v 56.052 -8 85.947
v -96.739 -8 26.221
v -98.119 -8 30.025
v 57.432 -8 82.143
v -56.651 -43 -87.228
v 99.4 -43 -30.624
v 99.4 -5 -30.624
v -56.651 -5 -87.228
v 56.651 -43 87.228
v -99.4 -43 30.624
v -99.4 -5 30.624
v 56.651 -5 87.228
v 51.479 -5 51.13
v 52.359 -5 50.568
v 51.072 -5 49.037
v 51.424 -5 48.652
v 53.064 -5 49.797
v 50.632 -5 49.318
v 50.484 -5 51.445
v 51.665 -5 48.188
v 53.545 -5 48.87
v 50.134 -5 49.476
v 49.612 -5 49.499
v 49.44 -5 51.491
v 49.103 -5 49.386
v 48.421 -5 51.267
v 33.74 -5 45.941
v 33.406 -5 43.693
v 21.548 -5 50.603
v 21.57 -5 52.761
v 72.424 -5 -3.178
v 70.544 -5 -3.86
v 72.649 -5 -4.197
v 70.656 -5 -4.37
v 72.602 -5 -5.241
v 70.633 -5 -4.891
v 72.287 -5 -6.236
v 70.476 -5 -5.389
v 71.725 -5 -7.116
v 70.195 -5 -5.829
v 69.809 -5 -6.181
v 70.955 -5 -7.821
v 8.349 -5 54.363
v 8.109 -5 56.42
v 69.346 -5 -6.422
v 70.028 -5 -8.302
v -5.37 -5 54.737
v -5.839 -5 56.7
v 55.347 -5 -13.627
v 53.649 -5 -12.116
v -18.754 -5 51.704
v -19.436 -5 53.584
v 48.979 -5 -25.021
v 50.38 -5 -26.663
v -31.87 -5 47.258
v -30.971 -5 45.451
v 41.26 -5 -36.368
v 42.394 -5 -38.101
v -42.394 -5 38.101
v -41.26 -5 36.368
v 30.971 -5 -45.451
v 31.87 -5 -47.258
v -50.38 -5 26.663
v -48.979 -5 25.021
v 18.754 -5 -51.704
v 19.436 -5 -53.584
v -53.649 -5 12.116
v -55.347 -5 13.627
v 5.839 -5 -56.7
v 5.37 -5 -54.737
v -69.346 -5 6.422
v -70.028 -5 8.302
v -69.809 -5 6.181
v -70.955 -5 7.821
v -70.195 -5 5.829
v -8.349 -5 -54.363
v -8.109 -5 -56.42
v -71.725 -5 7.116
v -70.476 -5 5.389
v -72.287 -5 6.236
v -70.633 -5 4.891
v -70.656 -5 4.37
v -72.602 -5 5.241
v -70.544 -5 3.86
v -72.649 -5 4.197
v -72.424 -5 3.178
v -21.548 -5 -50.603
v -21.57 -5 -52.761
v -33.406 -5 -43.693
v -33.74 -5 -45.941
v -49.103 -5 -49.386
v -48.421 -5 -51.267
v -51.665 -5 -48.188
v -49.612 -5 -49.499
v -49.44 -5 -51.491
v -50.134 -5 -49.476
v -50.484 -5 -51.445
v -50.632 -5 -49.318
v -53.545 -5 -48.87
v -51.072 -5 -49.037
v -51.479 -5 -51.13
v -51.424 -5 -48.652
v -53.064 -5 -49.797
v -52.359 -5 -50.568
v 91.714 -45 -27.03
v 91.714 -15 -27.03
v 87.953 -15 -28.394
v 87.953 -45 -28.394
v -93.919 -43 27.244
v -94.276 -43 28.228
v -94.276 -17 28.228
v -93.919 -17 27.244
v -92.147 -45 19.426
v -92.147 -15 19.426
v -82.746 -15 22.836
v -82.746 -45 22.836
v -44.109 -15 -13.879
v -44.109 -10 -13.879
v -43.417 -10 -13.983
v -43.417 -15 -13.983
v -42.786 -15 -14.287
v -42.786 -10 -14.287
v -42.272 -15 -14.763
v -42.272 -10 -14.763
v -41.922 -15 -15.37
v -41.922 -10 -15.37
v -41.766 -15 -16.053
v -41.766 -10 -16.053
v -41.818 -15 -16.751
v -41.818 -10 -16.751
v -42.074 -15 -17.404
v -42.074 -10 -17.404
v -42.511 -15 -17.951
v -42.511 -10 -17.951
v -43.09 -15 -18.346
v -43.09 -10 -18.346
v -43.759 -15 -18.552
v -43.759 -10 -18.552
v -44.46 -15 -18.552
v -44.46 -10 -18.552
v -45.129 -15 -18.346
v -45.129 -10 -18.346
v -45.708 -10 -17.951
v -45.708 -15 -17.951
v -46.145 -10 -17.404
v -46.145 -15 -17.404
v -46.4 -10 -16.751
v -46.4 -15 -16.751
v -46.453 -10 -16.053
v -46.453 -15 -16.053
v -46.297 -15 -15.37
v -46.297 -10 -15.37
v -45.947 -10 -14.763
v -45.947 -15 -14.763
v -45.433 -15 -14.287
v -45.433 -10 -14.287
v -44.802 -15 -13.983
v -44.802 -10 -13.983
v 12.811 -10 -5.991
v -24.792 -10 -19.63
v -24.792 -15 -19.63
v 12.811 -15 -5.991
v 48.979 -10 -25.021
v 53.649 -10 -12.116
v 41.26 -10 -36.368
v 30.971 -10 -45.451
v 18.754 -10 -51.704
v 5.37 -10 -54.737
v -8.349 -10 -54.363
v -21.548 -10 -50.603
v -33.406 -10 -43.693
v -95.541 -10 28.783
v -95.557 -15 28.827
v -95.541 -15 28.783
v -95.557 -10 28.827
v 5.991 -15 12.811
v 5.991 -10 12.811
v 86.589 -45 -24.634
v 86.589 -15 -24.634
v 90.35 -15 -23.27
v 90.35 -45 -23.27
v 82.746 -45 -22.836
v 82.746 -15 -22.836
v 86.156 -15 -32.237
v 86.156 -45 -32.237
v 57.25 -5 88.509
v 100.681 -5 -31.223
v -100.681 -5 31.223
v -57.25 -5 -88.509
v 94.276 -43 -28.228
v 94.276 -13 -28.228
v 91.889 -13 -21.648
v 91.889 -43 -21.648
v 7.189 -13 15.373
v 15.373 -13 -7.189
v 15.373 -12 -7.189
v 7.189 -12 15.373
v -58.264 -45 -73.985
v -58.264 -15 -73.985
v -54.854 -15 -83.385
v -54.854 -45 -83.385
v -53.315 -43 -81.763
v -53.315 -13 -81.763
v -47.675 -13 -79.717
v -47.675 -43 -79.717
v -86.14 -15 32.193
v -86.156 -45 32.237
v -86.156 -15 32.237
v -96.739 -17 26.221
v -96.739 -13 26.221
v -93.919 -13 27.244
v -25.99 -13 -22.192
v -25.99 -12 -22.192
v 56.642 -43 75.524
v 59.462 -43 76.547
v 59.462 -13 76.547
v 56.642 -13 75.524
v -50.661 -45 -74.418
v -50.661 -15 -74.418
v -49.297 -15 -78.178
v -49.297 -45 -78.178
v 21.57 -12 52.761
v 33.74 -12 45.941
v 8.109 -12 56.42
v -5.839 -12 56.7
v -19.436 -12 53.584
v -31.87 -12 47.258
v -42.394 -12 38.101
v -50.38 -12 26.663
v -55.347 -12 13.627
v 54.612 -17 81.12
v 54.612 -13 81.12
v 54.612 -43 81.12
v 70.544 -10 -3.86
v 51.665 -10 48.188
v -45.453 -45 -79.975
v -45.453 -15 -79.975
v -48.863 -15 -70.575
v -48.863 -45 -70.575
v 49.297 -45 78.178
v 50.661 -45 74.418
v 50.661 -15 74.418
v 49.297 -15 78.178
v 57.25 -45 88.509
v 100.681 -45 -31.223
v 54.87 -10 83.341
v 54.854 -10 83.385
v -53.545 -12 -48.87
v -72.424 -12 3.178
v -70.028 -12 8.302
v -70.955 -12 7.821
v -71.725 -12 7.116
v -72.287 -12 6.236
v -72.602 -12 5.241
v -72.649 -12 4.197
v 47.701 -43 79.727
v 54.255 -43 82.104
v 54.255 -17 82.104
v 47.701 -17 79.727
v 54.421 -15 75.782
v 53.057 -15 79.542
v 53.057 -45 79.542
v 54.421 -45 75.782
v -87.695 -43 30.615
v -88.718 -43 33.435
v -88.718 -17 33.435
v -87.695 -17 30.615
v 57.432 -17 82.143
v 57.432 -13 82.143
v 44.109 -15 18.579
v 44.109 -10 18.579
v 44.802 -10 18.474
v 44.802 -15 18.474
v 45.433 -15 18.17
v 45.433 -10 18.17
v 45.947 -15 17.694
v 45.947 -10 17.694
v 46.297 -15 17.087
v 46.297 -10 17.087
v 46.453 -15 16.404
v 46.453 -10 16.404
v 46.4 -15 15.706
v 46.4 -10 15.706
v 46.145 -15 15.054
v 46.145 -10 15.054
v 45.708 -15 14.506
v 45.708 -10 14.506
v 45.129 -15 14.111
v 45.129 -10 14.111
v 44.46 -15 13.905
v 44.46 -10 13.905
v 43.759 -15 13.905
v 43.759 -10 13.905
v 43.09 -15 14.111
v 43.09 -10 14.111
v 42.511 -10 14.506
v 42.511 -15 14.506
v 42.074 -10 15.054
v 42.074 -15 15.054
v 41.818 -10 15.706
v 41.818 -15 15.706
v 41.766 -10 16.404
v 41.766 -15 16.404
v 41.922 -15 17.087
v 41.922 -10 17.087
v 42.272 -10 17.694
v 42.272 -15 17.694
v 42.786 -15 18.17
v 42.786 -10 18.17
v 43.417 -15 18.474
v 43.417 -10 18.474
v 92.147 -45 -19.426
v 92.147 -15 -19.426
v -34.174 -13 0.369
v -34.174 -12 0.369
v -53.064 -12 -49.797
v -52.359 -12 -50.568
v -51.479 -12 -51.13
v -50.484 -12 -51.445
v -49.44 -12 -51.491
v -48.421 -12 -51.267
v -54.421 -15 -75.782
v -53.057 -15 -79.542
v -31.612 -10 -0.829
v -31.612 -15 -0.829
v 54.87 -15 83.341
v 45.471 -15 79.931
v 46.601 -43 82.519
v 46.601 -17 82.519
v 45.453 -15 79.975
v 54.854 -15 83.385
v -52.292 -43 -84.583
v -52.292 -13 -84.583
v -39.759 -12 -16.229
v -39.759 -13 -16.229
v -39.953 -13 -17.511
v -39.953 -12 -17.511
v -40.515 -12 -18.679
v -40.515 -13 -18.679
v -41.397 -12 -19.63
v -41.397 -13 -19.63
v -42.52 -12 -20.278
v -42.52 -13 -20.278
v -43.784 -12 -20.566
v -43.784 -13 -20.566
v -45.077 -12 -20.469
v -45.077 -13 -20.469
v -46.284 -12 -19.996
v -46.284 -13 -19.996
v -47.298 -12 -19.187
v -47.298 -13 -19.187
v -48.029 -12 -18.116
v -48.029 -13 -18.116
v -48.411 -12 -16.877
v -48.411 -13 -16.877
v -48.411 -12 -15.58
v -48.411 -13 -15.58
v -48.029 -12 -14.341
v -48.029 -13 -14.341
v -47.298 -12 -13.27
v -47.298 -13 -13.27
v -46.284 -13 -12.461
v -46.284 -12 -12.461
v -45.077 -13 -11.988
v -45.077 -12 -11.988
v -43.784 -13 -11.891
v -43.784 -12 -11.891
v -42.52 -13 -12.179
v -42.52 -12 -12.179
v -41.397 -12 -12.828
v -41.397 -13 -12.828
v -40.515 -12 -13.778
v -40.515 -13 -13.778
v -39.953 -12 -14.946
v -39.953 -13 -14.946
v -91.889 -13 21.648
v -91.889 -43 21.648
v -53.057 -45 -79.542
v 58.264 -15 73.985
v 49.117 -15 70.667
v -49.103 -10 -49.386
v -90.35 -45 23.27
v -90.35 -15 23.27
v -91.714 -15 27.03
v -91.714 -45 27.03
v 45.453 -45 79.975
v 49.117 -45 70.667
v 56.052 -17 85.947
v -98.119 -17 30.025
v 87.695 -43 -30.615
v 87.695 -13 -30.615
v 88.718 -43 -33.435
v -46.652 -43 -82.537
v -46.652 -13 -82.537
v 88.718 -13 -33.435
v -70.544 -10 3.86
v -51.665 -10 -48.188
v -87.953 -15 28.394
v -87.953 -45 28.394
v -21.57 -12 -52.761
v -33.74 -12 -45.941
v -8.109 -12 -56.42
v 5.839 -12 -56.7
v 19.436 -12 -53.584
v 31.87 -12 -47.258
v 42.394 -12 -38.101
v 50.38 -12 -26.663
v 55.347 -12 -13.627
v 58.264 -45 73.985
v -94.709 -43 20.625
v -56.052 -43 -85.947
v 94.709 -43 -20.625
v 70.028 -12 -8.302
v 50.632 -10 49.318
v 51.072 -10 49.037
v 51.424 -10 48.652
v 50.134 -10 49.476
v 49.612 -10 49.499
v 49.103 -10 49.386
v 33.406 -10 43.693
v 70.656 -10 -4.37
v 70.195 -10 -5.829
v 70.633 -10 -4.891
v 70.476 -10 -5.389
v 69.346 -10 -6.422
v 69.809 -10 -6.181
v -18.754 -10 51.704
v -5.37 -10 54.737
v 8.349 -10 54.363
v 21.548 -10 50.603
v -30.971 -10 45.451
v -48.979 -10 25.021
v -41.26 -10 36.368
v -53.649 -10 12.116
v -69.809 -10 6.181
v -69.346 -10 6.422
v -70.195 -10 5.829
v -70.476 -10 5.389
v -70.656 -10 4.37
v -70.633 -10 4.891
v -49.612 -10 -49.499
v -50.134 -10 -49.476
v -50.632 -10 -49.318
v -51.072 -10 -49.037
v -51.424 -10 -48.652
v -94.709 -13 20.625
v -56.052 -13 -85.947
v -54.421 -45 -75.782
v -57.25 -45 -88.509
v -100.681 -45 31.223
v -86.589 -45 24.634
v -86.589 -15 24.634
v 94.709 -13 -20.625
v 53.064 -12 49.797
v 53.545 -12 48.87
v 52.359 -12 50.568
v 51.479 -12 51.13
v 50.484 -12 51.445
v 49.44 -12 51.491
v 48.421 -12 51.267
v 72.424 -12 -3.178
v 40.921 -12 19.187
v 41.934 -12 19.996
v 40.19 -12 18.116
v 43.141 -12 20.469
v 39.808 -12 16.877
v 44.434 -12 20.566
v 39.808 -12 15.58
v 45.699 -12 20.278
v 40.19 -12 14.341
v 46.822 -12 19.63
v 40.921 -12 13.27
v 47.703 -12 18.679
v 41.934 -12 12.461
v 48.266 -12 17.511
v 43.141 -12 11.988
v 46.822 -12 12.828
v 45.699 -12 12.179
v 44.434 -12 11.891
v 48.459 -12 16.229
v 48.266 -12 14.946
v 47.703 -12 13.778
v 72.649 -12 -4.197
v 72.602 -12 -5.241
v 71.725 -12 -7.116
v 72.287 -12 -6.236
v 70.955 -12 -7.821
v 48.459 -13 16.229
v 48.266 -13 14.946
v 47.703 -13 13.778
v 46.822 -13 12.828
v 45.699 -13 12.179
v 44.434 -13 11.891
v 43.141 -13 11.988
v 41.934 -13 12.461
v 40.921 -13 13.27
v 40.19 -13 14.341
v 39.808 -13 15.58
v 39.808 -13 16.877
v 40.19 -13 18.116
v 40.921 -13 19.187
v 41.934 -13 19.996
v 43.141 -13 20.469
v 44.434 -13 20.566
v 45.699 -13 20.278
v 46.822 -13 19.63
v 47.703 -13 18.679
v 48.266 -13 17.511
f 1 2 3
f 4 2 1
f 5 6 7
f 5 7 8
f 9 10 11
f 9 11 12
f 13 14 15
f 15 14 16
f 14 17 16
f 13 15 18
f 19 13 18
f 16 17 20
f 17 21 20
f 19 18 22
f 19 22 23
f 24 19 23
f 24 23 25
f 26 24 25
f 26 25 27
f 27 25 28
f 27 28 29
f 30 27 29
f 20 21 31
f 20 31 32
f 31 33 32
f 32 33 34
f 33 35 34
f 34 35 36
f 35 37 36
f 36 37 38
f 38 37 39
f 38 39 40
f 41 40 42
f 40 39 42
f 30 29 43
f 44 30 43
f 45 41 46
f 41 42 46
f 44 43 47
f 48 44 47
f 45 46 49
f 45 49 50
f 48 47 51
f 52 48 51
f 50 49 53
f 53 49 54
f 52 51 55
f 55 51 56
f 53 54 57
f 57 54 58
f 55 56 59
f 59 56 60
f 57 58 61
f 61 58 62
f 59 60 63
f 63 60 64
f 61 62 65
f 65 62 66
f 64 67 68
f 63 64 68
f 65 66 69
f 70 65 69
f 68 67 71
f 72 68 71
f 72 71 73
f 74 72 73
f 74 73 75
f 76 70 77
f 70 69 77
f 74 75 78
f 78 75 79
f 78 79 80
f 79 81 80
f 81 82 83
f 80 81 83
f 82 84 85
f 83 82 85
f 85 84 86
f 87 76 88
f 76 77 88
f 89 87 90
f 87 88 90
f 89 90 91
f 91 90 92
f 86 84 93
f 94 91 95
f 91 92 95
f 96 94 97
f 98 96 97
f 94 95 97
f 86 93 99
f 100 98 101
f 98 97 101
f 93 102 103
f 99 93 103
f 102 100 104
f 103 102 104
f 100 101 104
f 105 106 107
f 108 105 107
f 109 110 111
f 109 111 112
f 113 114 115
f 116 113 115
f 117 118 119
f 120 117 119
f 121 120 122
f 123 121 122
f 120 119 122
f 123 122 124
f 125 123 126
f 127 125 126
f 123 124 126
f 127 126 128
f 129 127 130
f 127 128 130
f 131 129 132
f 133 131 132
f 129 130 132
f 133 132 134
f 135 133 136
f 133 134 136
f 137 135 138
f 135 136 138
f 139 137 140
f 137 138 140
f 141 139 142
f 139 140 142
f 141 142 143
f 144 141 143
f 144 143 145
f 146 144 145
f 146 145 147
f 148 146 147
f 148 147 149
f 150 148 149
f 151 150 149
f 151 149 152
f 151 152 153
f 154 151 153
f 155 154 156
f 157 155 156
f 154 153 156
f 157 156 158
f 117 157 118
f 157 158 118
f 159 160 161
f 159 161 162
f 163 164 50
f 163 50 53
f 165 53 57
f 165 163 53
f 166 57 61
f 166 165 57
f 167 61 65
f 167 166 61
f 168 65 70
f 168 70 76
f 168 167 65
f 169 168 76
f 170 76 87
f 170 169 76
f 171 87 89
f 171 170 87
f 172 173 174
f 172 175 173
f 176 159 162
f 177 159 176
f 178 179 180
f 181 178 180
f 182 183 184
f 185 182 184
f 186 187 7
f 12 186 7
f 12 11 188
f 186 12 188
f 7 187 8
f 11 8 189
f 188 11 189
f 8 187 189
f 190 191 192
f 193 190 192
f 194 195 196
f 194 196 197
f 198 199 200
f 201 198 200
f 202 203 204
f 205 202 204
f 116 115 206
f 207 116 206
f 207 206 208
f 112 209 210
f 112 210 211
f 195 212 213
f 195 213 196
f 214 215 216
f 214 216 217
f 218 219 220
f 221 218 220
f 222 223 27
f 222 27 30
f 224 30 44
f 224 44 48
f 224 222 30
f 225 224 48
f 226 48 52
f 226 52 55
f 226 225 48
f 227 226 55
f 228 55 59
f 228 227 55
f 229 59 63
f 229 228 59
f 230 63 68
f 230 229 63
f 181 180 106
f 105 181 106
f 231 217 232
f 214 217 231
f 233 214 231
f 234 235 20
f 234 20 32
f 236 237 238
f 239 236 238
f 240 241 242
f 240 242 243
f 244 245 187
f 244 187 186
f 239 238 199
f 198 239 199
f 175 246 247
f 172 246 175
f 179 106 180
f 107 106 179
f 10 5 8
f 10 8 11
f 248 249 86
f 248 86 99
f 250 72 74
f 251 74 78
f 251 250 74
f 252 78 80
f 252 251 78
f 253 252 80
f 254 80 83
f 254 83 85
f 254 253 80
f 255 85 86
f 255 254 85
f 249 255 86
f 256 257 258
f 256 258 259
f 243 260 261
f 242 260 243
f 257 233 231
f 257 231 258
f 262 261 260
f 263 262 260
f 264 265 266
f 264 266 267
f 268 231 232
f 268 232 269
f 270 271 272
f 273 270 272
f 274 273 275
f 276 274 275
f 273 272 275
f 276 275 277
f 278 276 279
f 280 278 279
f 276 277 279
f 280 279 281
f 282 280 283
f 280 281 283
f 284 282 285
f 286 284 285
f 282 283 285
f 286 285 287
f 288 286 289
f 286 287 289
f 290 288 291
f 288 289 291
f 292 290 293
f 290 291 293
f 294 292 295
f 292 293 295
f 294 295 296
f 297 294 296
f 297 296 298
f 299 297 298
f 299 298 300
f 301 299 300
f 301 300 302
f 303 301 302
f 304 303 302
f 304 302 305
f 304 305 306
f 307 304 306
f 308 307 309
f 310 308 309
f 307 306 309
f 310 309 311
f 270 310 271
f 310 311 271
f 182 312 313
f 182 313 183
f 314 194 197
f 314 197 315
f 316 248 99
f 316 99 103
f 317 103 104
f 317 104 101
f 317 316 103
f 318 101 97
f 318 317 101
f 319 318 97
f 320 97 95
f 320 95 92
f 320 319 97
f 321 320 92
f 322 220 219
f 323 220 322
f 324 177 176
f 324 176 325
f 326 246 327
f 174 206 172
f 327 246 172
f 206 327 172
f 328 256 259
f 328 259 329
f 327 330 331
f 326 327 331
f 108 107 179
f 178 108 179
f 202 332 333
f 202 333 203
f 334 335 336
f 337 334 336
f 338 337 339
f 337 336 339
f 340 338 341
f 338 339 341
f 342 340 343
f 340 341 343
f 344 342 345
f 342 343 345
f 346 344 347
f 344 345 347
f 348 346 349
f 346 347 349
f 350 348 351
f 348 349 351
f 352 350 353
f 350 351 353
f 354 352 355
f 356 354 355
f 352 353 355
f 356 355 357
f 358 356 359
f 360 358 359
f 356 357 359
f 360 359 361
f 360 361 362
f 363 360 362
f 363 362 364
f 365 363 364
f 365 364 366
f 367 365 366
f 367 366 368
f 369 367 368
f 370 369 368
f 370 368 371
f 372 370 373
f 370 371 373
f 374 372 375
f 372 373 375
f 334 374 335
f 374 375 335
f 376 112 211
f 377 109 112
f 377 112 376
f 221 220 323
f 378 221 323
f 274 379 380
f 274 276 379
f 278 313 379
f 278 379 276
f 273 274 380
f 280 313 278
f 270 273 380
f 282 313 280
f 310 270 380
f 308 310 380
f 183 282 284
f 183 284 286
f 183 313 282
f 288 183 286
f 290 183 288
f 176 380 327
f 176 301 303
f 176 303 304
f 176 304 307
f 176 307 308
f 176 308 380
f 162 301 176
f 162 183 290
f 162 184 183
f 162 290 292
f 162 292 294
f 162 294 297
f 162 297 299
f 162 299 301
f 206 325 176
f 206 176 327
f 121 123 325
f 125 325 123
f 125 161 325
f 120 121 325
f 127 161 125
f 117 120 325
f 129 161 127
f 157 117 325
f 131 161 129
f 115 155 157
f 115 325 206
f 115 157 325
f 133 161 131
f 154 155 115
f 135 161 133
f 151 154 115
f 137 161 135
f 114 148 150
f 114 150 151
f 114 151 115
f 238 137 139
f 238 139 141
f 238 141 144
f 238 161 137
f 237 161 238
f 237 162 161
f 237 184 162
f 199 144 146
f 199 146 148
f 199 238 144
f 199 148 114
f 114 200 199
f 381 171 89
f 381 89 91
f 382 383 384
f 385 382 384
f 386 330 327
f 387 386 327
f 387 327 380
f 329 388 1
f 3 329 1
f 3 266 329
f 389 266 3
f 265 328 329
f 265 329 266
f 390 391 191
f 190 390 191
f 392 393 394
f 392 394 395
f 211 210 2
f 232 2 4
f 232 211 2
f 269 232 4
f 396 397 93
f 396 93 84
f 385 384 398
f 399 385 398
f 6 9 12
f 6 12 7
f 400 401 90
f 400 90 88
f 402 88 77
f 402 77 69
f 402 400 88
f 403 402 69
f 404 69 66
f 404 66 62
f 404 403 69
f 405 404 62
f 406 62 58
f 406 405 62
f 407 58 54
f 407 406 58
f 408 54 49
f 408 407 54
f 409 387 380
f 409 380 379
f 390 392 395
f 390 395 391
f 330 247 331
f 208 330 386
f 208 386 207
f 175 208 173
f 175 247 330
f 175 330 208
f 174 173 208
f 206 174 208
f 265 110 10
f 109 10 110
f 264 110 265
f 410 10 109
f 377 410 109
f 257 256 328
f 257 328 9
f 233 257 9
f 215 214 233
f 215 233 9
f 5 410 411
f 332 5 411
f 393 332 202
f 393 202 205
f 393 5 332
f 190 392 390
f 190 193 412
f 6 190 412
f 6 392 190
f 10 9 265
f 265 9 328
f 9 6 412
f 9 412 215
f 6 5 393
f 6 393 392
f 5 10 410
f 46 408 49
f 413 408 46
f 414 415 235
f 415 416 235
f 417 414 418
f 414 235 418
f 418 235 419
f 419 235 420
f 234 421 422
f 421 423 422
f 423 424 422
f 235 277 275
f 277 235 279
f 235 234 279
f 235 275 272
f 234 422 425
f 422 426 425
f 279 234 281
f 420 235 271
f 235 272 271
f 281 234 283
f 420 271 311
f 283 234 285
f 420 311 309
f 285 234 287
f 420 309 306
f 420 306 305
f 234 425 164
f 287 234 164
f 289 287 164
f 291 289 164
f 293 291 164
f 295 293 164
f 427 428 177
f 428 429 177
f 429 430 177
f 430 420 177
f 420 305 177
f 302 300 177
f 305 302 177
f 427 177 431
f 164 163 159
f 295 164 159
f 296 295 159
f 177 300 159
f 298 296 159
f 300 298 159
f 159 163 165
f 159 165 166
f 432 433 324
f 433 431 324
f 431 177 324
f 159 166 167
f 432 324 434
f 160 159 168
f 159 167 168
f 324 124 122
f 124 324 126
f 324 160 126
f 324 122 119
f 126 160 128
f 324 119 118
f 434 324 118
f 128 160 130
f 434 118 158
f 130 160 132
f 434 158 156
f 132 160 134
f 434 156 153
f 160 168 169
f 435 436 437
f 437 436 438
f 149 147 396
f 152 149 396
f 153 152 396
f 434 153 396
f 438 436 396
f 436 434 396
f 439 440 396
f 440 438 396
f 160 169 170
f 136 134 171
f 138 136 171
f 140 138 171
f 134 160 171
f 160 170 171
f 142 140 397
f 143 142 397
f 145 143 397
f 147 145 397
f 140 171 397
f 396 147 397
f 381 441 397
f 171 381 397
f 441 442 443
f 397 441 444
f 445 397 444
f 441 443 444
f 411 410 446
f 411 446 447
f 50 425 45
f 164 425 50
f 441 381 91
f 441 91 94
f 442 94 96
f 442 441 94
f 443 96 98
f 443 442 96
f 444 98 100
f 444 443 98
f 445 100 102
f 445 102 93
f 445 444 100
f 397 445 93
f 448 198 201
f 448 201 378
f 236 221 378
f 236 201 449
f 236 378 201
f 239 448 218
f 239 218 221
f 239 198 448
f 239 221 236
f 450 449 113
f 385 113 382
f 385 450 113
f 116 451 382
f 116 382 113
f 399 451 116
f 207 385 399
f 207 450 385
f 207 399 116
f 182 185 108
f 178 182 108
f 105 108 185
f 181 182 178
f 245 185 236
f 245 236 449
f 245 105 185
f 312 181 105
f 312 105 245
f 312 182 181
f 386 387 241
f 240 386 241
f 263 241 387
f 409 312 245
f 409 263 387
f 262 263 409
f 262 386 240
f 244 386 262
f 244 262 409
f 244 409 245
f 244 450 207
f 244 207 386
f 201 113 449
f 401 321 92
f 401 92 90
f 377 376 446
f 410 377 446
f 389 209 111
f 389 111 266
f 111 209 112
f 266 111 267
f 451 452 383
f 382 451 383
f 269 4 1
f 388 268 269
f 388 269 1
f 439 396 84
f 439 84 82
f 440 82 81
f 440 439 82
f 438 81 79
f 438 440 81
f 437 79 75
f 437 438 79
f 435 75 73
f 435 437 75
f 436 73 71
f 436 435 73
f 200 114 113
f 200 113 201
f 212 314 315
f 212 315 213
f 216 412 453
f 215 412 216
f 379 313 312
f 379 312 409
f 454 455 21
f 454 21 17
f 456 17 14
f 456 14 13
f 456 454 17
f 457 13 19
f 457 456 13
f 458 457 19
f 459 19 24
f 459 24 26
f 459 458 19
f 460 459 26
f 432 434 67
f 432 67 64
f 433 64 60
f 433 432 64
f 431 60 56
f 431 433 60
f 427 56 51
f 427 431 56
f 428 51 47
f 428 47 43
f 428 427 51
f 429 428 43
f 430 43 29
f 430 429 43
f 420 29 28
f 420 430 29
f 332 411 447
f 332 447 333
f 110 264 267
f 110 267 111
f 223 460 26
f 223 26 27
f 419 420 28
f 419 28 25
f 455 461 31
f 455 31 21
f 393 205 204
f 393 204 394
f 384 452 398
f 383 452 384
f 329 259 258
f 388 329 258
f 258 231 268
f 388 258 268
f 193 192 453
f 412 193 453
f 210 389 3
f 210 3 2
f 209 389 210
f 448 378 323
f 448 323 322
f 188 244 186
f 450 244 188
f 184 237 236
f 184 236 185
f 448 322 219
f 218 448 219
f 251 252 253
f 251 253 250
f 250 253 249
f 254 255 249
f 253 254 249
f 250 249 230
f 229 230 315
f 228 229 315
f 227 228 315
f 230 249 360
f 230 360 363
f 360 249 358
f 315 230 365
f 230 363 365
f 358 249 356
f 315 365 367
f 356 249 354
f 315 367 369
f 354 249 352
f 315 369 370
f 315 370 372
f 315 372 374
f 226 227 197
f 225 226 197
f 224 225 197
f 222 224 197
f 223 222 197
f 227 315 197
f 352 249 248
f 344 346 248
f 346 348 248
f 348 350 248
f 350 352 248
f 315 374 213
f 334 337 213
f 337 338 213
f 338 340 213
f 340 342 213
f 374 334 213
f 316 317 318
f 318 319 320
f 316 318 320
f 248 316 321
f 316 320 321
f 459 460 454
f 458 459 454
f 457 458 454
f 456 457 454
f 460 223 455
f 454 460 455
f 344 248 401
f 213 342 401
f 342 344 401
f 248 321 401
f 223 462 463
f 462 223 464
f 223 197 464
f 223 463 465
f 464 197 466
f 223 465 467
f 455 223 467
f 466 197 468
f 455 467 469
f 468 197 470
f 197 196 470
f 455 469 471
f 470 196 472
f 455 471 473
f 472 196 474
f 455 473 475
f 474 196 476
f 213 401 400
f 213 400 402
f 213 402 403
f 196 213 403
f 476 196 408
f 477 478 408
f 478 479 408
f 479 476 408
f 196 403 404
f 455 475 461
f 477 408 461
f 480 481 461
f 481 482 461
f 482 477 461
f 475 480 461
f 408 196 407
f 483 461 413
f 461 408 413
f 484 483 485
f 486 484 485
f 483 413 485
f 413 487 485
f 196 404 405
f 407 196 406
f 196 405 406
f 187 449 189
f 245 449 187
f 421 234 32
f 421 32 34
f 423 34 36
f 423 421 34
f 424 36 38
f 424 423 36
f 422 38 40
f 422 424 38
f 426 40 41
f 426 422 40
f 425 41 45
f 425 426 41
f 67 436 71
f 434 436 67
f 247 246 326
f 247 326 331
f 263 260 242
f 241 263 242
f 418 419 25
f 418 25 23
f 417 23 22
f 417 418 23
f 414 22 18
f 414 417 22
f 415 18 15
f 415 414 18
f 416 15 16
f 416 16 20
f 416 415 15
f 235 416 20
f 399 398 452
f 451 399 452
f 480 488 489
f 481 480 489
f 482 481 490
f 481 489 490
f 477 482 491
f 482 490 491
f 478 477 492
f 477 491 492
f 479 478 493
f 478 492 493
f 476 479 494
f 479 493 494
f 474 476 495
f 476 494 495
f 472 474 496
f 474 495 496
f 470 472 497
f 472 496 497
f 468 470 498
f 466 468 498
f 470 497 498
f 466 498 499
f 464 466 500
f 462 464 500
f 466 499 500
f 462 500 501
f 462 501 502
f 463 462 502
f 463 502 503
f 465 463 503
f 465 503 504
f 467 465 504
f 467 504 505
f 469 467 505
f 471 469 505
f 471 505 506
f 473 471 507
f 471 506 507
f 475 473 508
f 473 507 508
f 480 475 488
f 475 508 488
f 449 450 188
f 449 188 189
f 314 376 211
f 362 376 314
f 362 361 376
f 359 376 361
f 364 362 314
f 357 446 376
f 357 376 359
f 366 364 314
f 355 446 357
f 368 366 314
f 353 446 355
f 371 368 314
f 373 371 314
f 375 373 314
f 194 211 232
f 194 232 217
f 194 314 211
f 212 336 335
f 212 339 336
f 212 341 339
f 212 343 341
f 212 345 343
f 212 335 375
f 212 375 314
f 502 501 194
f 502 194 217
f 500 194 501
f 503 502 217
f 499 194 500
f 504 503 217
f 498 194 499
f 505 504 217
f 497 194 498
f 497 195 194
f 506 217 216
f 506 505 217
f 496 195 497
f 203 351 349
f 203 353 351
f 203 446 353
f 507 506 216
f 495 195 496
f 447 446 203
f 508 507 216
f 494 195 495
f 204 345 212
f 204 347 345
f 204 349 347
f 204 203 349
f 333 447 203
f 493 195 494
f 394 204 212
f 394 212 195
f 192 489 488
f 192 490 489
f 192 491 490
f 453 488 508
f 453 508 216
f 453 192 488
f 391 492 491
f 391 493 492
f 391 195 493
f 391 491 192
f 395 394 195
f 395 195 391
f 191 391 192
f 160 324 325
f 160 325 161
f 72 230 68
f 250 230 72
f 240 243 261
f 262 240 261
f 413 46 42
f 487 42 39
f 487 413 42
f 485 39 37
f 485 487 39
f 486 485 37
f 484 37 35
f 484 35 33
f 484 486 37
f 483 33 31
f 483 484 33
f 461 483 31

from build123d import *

# Parameters (mm, degrees)
EXTRUDE_1_DEPTH      = 50
SHELL_1_T            = -5
EXTRUDE_2_DEPTH      = 5
SKETCH_10_R          = 2.35
EXTRUDE_3_DEPTH      = 5
CUT_EXTRUDE_1_DEPTH  = 5
EXTRUDE_START        = -30
EXTRUDE_4_DEPTH      = 30
SHELL_START          = -13
SHELL_13_DEPTH       = 8
SHELL_START_2        = -43
SHELL_13_2_DEPTH     = 30
SHELL_13_3_OUTLINE_R = 4.35
SHELL_13_3_DEPTH     = 1
SHELL_START_3        = -8
SHELL_13_4_DEPTH     = 3
SHELL_START_4        = -5
SHELL_13_5_DEPTH     = 3
SHELL_13_6_DEPTH     = 26
CUT_EXTRUDE_2_DEPTH  = 144.120865122
CUT_EXTRUDE_3_DEPTH  = 5


# Read off the part's stored shape, not the designer's step: 凸台-拉伸4, 抽壳13
with BuildPart() as part:
    # 草图3 → 凸台-拉伸1 (new body)
    with BuildSketch(Plane(origin=(0, 0, 0), x_dir=(1, 0, 0), z_dir=(0, 1, 0))):
        Polygon((57.849497127, -89.790549593), (-101.961949946, -31.82244298), (-57.849497127, 89.790549593), (101.961949946, 31.82244298), align=None)
    extrude(amount=-EXTRUDE_1_DEPTH)

    # 抽壳1
    shell_1_openings = [part.faces().sort_by_distance(p)[0] for p in [
        (0, 0, 0),
    ]]
    offset(amount=SHELL_1_T, openings=shell_1_openings, kind=Kind.INTERSECTION)

    # 草图4 → 凸台-拉伸2 (add)
    with BuildSketch(Plane(origin=(0, -10, 0), x_dir=(1, 0, 0), z_dir=(0, 1, 0))):
        Polygon((-54.85410476, 83.385268602), (95.556668956, 28.827050613), (54.793783145, -83.551568403), (-95.616990571, -28.993350414), align=None)
        with BuildLine():
            Line((-33.405753886, 43.6927409), (-49.102625926, 49.386437869))
            ThreePointArc((-49.102625926, 49.386437869), (-50.631828553, 49.317990247), (-51.664738322, 48.188280923))
            Line((-51.664738322, 48.188280923), (-70.544015322, -3.859728807))
            ThreePointArc((-70.544015322, -3.859728807), (-70.4755677, -5.388931433), (-69.345858375, -6.421841203))
            Line((-69.345858375, -6.421841203), (-53.648986335, -12.115538173))
            ThreePointArc((-53.648986335, -12.115538173), (-18.754387434, -51.703703465), (33.405753886, -43.6927409))
            Line((33.405753886, -43.6927409), (49.102625926, -49.386437869))
            ThreePointArc((49.102625926, -49.386437869), (50.631828553, -49.317990247), (51.664738322, -48.188280923))
            Line((51.664738322, -48.188280923), (70.544015322, 3.859728807))
            ThreePointArc((70.544015322, 3.859728807), (70.4755677, 5.388931433), (69.345858375, 6.421841203))
            Line((69.345858375, 6.421841203), (53.648986335, 12.115538173))
            ThreePointArc((53.648986335, 12.115538173), (18.754387434, 51.703703465), (-33.405753886, 43.6927409))
        make_face(mode=Mode.SUBTRACT)
    extrude(amount=EXTRUDE_2_DEPTH)

    # 草图10 → 凸台-拉伸3 (add)
    with BuildSketch(Plane(origin=(0, -10, 0), x_dir=(1, 0, 0), z_dir=(0, 1, 0))):
        Polygon((-54.85410476, 83.385268602), (95.556668956, 28.827050613), (54.87017905, -83.340953621), (-95.540594666, -28.782735632), align=None)
        with Locations(Location((44.109349089, -16.22853422, 0), (0, 0, 270))):
            Circle(SKETCH_10_R, mode=Mode.SUBTRACT)
        with Locations(Location((-44.109349089, 16.22853422, 0), (0, 0, 270))):
            Circle(SKETCH_10_R, mode=Mode.SUBTRACT)
        Polygon((5.990784733, -12.810561982), (-31.611908696, 0.828992516), (-24.792131447, 19.63033923), (12.810561982, 5.990784733), align=None, mode=Mode.SUBTRACT)
    extrude(amount=-EXTRUDE_3_DEPTH)

    # 草图11 → 切除-拉伸1 (cut)
    with BuildSketch(Plane(origin=(0, -45, 0), x_dir=(1, 0, 0), z_dir=(0, 1, 0))):
        Polygon((57.849497127, -89.790549593), (101.961949946, 31.82244298), (-57.849497127, 89.790549593), (-101.961949946, -31.82244298), align=None)
    extrude(amount=-CUT_EXTRUDE_1_DEPTH, mode=Mode.SUBTRACT)

    # 凸台-拉伸4 outline → 凸台-拉伸4 (add)
    # profile 1 of 4: a face of its own
    with BuildSketch(Plane.XZ.offset(45).offset(EXTRUDE_START)):
        Polygon((92.146780331, -19.426377256), (82.746106974, -22.83626588), (86.155995598, -32.236939238), (95.556668956, -28.827050613), align=None)
        Polygon((91.713500361, -27.029815193), (87.953231018, -28.393770643), (86.589275569, -24.6335013), (90.349544911, -23.26954585), align=None, mode=Mode.SUBTRACT)
    # profile 2 of 4: a face of its own
    with BuildSketch(Plane.XZ.offset(45).offset(EXTRUDE_START)):
        Polygon((-54.85410476, -83.385268602), (-45.453403196, -79.975369746), (-48.863293462, -70.574691864), (-58.263966819, -73.984580488), align=None)
        Polygon((-49.296573432, -78.178129801), (-53.056842775, -79.542085251), (-54.420798224, -75.781815908), (-50.660528881, -74.417860458), align=None, mode=Mode.SUBTRACT)
    # profile 3 of 4: a face of its own
    with BuildSketch(Plane.XZ.offset(45).offset(EXTRUDE_START)):
        Polygon((49.11739228, 70.666865773), (58.263993385, 73.984595245), (54.87017905, 83.340953621), (54.85410476, 83.385268602), (45.453431403, 79.975379978), align=None)
        Polygon((50.660555447, 74.417875215), (49.296599998, 78.178144558), (53.05686934, 79.542100008), (54.42082479, 75.781830665), align=None, mode=Mode.SUBTRACT)
    # profile 4 of 4: a face of its own
    with BuildSketch(Plane.XZ.offset(45).offset(EXTRUDE_START)):
        Polygon((-95.540594666, 28.782735632), (-92.146780332, 19.426377256), (-82.746106974, 22.83626588), (-86.155995598, 32.236939238), (-95.556668956, 28.827050613), align=None)
        Polygon((-91.713500361, 27.029815193), (-87.953231018, 28.393770643), (-86.589275569, 24.6335013), (-90.349544911, 23.26954585), align=None, mode=Mode.SUBTRACT)
    extrude(amount=EXTRUDE_4_DEPTH)

    # 抽壳13 outline → 抽壳13 (cut)
    with BuildSketch(Plane(origin=(0, 0, 0), x_dir=(1, 0, 0), z_dir=(0, 1, 0)).offset(SHELL_START)):
        Polygon((-99.39983755, -30.624286033), (56.65134018, -87.228437197), (99.39983755, 30.624286033), (-56.65134018, 87.228437197), align=None)
        Polygon((57.432291447, -82.142796675), (56.052261707, -85.947380999), (-98.118781352, -30.02520756), (-96.738751612, -26.220623236), align=None, mode=Mode.SUBTRACT)
        with BuildLine():
            Line((-72.424149993, -3.177751082), (-53.544872994, 48.870258648))
            ThreePointArc((-53.544872994, 48.870258648), (-51.479053454, 51.129677297), (-48.420648201, 51.266572541))
            Line((-48.420648201, 51.266572541), (-33.739920947, 45.941459864))
            ThreePointArc((-33.739920947, 45.941459864), (19.436365158, 53.583838136), (55.347108846, 13.627088551))
            Line((55.347108846, 13.627088551), (70.0278361, 8.301975874))
            ThreePointArc((70.0278361, 8.301975874), (72.28725475, 6.236156335), (72.424149993, 3.177751082))
            Line((72.424149993, 3.177751082), (53.544872994, -48.870258648))
            ThreePointArc((53.544872994, -48.870258648), (51.479053454, -51.129677297), (48.420648201, -51.266572541))
            Line((48.420648201, -51.266572541), (33.739920947, -45.941459864))
            ThreePointArc((33.739920947, -45.941459864), (-19.436365158, -53.583838136), (-55.347108846, -13.627088551))
            Line((-55.347108846, -13.627088551), (-70.0278361, -8.301975874))
            ThreePointArc((-70.0278361, -8.301975874), (-72.28725475, -6.236156335), (-72.424149993, -3.177751082))
        make_face(mode=Mode.SUBTRACT)
    extrude(amount=SHELL_13_DEPTH, mode=Mode.SUBTRACT)

    # Shell 13 2 outline → Shell 13 2 (cut)
    with BuildSketch(Plane(origin=(0, 0, 0), x_dir=(1, 0, 0), z_dir=(0, 1, 0)).offset(SHELL_START_2)):
        Polygon((-99.39983755, -30.624286033), (56.65134018, -87.228437197), (99.39983755, 30.624286033), (-56.65134018, 87.228437197), align=None)
        Polygon((56.641948324, -75.523741054), (54.612089439, -81.119830088), (57.432291447, -82.142796675), (56.052261707, -85.947380999), (-98.118781352, -30.02520756), (-96.738751612, -26.220623236), (-93.918549605, -27.243589823), (-91.88869072, -21.64750079), (-94.708892728, -20.624534203), (-56.052261707, 85.947380999), (-52.291964157, 84.583415318), (-53.314932385, 81.763208785), (-47.674528371, 79.71727561), (-46.651560142, 82.537482143), (88.718107995, 33.435096184), (87.695141407, 30.614894177), (94.275612757, 28.22797214), (91.88869072, 21.64750079), (94.708892728, 20.624534203), (59.462150331, -76.546707641), align=None, mode=Mode.SUBTRACT)
    extrude(amount=SHELL_13_2_DEPTH, mode=Mode.SUBTRACT)

    # Shell 13 3 outline → Shell 13 3 (cut)
    with BuildSketch(Plane(origin=(0, 0, 0), x_dir=(1, 0, 0), z_dir=(0, 1, 0)).offset(SHELL_START)):
        with BuildLine():
            ThreePointArc((-48.420648201, 51.266572541), (-51.479053454, 51.129677297), (-53.544872994, 48.870258648))
            Line((-53.544872994, 48.870258648), (-72.424149993, -3.177751082))
            ThreePointArc((-72.424149993, -3.177751082), (-72.28725475, -6.236156335), (-70.0278361, -8.301975874))
            Line((-70.0278361, -8.301975874), (-55.347108846, -13.627088551))
            ThreePointArc((-55.347108846, -13.627088551), (-19.436365158, -53.583838136), (33.739920947, -45.941459864))
            Line((33.739920947, -45.941459864), (48.420648201, -51.266572541))
            ThreePointArc((48.420648201, -51.266572541), (51.479053454, -51.129677297), (53.544872994, -48.870258648))
            Line((53.544872994, -48.870258648), (72.424149993, 3.177751082))
            ThreePointArc((72.424149993, 3.177751082), (72.28725475, 6.236156335), (70.0278361, 8.301975874))
            Line((70.0278361, 8.301975874), (55.347108846, 13.627088551))
            ThreePointArc((55.347108846, 13.627088551), (19.436365158, 53.583838136), (-33.739920947, 45.941459864))
            Line((-33.739920947, 45.941459864), (-48.420648201, 51.266572541))
        make_face()
        with Locations((44.109349089, -16.22853422)):
            Circle(SHELL_13_3_OUTLINE_R, mode=Mode.SUBTRACT)
        with Locations((-44.109349089, 16.22853422)):
            Circle(SHELL_13_3_OUTLINE_R, mode=Mode.SUBTRACT)
        Polygon((15.372674378, 7.18894168), (7.18894168, -15.372674378), (-34.174021092, -0.369164431), (-25.990288394, 22.192451627), align=None, mode=Mode.SUBTRACT)
    extrude(amount=SHELL_13_3_DEPTH, mode=Mode.SUBTRACT)

    # Shell 13 4 outline → Shell 13 4 (cut)
    with BuildSketch(Plane(origin=(0, 0, 0), x_dir=(1, 0, 0), z_dir=(0, 1, 0)).offset(SHELL_START_3)):
        Polygon((56.052261707, -85.947380999), (57.432291447, -82.142796675), (-96.738751612, -26.220623236), (-98.118781352, -30.02520756), align=None)
    extrude(amount=SHELL_13_4_DEPTH, mode=Mode.SUBTRACT)

    # Shell 13 5 outline → Shell 13 5 (cut)
    with BuildSketch(Plane(origin=(0, 0, 0), x_dir=(1, 0, 0), z_dir=(0, 1, 0)).offset(SHELL_START_4)):
        Polygon((-99.39983755, -30.624286033), (56.65134018, -87.228437197), (99.39983755, 30.624286033), (-56.65134018, 87.228437197), align=None)
        Polygon((59.462150331, -76.546707641), (56.052261707, -85.947380999), (-98.118781352, -30.02520756), (-94.708892728, -20.624534203), (-56.052261707, 85.947380999), (-46.651560142, 82.537482143), (88.718107995, 33.435096184), (98.118781352, 30.02520756), (94.708892728, 20.624534203), align=None, mode=Mode.SUBTRACT)
    extrude(amount=SHELL_13_5_DEPTH, mode=Mode.SUBTRACT)

    # Shell 13 6 outline → Shell 13 6 (cut)
    with BuildSketch(Plane(origin=(0, 0, 0), x_dir=(1, 0, 0), z_dir=(0, 1, 0)).offset(SHELL_START_2)):
        Polygon((54.612089439, -81.119830088), (54.255026287, -82.104212404), (47.700648719, -79.726755316), (46.601460456, -82.519309577), (56.052261707, -85.947380999), (57.432291447, -82.142796675), align=None)
        Polygon((-94.275612757, -28.22797214), (-93.918549605, -27.243589823), (-96.738751612, -26.220623236), (-98.118781352, -30.02520756), (-88.718107995, -33.435096184), (-87.695141407, -30.614894177), align=None)
    extrude(amount=SHELL_13_6_DEPTH, mode=Mode.SUBTRACT)

    # 草图16 → 切除-拉伸2 (cut, through all)
    with BuildSketch(Plane.XZ.offset(45)):
        Polygon((-101.961949946, 31.82244298), (57.849497127, 89.790549593), (101.961949946, -31.82244298), (-57.849497127, -89.790549593), align=None)
        Polygon((-100.680893748, 31.223364506), (-57.250418654, -88.509493395), (100.680893748, -31.223364506), (57.250418654, 88.509493395), align=None, mode=Mode.SUBTRACT)
    extrude(amount=-CUT_EXTRUDE_2_DEPTH, mode=Mode.SUBTRACT)

    # 草图17 → 切除-拉伸3 (cut)
    with BuildSketch(Plane(origin=(0, 0, 0), x_dir=(1, 0, 0), z_dir=(0, 1, 0))):
        Polygon((57.250418654, -88.509493395), (-100.680893748, -31.223364506), (-57.250418654, 88.509493395), (100.680893748, 31.223364506), align=None)
    extrude(amount=-CUT_EXTRUDE_3_DEPTH, mode=Mode.SUBTRACT)


solid = part.part
